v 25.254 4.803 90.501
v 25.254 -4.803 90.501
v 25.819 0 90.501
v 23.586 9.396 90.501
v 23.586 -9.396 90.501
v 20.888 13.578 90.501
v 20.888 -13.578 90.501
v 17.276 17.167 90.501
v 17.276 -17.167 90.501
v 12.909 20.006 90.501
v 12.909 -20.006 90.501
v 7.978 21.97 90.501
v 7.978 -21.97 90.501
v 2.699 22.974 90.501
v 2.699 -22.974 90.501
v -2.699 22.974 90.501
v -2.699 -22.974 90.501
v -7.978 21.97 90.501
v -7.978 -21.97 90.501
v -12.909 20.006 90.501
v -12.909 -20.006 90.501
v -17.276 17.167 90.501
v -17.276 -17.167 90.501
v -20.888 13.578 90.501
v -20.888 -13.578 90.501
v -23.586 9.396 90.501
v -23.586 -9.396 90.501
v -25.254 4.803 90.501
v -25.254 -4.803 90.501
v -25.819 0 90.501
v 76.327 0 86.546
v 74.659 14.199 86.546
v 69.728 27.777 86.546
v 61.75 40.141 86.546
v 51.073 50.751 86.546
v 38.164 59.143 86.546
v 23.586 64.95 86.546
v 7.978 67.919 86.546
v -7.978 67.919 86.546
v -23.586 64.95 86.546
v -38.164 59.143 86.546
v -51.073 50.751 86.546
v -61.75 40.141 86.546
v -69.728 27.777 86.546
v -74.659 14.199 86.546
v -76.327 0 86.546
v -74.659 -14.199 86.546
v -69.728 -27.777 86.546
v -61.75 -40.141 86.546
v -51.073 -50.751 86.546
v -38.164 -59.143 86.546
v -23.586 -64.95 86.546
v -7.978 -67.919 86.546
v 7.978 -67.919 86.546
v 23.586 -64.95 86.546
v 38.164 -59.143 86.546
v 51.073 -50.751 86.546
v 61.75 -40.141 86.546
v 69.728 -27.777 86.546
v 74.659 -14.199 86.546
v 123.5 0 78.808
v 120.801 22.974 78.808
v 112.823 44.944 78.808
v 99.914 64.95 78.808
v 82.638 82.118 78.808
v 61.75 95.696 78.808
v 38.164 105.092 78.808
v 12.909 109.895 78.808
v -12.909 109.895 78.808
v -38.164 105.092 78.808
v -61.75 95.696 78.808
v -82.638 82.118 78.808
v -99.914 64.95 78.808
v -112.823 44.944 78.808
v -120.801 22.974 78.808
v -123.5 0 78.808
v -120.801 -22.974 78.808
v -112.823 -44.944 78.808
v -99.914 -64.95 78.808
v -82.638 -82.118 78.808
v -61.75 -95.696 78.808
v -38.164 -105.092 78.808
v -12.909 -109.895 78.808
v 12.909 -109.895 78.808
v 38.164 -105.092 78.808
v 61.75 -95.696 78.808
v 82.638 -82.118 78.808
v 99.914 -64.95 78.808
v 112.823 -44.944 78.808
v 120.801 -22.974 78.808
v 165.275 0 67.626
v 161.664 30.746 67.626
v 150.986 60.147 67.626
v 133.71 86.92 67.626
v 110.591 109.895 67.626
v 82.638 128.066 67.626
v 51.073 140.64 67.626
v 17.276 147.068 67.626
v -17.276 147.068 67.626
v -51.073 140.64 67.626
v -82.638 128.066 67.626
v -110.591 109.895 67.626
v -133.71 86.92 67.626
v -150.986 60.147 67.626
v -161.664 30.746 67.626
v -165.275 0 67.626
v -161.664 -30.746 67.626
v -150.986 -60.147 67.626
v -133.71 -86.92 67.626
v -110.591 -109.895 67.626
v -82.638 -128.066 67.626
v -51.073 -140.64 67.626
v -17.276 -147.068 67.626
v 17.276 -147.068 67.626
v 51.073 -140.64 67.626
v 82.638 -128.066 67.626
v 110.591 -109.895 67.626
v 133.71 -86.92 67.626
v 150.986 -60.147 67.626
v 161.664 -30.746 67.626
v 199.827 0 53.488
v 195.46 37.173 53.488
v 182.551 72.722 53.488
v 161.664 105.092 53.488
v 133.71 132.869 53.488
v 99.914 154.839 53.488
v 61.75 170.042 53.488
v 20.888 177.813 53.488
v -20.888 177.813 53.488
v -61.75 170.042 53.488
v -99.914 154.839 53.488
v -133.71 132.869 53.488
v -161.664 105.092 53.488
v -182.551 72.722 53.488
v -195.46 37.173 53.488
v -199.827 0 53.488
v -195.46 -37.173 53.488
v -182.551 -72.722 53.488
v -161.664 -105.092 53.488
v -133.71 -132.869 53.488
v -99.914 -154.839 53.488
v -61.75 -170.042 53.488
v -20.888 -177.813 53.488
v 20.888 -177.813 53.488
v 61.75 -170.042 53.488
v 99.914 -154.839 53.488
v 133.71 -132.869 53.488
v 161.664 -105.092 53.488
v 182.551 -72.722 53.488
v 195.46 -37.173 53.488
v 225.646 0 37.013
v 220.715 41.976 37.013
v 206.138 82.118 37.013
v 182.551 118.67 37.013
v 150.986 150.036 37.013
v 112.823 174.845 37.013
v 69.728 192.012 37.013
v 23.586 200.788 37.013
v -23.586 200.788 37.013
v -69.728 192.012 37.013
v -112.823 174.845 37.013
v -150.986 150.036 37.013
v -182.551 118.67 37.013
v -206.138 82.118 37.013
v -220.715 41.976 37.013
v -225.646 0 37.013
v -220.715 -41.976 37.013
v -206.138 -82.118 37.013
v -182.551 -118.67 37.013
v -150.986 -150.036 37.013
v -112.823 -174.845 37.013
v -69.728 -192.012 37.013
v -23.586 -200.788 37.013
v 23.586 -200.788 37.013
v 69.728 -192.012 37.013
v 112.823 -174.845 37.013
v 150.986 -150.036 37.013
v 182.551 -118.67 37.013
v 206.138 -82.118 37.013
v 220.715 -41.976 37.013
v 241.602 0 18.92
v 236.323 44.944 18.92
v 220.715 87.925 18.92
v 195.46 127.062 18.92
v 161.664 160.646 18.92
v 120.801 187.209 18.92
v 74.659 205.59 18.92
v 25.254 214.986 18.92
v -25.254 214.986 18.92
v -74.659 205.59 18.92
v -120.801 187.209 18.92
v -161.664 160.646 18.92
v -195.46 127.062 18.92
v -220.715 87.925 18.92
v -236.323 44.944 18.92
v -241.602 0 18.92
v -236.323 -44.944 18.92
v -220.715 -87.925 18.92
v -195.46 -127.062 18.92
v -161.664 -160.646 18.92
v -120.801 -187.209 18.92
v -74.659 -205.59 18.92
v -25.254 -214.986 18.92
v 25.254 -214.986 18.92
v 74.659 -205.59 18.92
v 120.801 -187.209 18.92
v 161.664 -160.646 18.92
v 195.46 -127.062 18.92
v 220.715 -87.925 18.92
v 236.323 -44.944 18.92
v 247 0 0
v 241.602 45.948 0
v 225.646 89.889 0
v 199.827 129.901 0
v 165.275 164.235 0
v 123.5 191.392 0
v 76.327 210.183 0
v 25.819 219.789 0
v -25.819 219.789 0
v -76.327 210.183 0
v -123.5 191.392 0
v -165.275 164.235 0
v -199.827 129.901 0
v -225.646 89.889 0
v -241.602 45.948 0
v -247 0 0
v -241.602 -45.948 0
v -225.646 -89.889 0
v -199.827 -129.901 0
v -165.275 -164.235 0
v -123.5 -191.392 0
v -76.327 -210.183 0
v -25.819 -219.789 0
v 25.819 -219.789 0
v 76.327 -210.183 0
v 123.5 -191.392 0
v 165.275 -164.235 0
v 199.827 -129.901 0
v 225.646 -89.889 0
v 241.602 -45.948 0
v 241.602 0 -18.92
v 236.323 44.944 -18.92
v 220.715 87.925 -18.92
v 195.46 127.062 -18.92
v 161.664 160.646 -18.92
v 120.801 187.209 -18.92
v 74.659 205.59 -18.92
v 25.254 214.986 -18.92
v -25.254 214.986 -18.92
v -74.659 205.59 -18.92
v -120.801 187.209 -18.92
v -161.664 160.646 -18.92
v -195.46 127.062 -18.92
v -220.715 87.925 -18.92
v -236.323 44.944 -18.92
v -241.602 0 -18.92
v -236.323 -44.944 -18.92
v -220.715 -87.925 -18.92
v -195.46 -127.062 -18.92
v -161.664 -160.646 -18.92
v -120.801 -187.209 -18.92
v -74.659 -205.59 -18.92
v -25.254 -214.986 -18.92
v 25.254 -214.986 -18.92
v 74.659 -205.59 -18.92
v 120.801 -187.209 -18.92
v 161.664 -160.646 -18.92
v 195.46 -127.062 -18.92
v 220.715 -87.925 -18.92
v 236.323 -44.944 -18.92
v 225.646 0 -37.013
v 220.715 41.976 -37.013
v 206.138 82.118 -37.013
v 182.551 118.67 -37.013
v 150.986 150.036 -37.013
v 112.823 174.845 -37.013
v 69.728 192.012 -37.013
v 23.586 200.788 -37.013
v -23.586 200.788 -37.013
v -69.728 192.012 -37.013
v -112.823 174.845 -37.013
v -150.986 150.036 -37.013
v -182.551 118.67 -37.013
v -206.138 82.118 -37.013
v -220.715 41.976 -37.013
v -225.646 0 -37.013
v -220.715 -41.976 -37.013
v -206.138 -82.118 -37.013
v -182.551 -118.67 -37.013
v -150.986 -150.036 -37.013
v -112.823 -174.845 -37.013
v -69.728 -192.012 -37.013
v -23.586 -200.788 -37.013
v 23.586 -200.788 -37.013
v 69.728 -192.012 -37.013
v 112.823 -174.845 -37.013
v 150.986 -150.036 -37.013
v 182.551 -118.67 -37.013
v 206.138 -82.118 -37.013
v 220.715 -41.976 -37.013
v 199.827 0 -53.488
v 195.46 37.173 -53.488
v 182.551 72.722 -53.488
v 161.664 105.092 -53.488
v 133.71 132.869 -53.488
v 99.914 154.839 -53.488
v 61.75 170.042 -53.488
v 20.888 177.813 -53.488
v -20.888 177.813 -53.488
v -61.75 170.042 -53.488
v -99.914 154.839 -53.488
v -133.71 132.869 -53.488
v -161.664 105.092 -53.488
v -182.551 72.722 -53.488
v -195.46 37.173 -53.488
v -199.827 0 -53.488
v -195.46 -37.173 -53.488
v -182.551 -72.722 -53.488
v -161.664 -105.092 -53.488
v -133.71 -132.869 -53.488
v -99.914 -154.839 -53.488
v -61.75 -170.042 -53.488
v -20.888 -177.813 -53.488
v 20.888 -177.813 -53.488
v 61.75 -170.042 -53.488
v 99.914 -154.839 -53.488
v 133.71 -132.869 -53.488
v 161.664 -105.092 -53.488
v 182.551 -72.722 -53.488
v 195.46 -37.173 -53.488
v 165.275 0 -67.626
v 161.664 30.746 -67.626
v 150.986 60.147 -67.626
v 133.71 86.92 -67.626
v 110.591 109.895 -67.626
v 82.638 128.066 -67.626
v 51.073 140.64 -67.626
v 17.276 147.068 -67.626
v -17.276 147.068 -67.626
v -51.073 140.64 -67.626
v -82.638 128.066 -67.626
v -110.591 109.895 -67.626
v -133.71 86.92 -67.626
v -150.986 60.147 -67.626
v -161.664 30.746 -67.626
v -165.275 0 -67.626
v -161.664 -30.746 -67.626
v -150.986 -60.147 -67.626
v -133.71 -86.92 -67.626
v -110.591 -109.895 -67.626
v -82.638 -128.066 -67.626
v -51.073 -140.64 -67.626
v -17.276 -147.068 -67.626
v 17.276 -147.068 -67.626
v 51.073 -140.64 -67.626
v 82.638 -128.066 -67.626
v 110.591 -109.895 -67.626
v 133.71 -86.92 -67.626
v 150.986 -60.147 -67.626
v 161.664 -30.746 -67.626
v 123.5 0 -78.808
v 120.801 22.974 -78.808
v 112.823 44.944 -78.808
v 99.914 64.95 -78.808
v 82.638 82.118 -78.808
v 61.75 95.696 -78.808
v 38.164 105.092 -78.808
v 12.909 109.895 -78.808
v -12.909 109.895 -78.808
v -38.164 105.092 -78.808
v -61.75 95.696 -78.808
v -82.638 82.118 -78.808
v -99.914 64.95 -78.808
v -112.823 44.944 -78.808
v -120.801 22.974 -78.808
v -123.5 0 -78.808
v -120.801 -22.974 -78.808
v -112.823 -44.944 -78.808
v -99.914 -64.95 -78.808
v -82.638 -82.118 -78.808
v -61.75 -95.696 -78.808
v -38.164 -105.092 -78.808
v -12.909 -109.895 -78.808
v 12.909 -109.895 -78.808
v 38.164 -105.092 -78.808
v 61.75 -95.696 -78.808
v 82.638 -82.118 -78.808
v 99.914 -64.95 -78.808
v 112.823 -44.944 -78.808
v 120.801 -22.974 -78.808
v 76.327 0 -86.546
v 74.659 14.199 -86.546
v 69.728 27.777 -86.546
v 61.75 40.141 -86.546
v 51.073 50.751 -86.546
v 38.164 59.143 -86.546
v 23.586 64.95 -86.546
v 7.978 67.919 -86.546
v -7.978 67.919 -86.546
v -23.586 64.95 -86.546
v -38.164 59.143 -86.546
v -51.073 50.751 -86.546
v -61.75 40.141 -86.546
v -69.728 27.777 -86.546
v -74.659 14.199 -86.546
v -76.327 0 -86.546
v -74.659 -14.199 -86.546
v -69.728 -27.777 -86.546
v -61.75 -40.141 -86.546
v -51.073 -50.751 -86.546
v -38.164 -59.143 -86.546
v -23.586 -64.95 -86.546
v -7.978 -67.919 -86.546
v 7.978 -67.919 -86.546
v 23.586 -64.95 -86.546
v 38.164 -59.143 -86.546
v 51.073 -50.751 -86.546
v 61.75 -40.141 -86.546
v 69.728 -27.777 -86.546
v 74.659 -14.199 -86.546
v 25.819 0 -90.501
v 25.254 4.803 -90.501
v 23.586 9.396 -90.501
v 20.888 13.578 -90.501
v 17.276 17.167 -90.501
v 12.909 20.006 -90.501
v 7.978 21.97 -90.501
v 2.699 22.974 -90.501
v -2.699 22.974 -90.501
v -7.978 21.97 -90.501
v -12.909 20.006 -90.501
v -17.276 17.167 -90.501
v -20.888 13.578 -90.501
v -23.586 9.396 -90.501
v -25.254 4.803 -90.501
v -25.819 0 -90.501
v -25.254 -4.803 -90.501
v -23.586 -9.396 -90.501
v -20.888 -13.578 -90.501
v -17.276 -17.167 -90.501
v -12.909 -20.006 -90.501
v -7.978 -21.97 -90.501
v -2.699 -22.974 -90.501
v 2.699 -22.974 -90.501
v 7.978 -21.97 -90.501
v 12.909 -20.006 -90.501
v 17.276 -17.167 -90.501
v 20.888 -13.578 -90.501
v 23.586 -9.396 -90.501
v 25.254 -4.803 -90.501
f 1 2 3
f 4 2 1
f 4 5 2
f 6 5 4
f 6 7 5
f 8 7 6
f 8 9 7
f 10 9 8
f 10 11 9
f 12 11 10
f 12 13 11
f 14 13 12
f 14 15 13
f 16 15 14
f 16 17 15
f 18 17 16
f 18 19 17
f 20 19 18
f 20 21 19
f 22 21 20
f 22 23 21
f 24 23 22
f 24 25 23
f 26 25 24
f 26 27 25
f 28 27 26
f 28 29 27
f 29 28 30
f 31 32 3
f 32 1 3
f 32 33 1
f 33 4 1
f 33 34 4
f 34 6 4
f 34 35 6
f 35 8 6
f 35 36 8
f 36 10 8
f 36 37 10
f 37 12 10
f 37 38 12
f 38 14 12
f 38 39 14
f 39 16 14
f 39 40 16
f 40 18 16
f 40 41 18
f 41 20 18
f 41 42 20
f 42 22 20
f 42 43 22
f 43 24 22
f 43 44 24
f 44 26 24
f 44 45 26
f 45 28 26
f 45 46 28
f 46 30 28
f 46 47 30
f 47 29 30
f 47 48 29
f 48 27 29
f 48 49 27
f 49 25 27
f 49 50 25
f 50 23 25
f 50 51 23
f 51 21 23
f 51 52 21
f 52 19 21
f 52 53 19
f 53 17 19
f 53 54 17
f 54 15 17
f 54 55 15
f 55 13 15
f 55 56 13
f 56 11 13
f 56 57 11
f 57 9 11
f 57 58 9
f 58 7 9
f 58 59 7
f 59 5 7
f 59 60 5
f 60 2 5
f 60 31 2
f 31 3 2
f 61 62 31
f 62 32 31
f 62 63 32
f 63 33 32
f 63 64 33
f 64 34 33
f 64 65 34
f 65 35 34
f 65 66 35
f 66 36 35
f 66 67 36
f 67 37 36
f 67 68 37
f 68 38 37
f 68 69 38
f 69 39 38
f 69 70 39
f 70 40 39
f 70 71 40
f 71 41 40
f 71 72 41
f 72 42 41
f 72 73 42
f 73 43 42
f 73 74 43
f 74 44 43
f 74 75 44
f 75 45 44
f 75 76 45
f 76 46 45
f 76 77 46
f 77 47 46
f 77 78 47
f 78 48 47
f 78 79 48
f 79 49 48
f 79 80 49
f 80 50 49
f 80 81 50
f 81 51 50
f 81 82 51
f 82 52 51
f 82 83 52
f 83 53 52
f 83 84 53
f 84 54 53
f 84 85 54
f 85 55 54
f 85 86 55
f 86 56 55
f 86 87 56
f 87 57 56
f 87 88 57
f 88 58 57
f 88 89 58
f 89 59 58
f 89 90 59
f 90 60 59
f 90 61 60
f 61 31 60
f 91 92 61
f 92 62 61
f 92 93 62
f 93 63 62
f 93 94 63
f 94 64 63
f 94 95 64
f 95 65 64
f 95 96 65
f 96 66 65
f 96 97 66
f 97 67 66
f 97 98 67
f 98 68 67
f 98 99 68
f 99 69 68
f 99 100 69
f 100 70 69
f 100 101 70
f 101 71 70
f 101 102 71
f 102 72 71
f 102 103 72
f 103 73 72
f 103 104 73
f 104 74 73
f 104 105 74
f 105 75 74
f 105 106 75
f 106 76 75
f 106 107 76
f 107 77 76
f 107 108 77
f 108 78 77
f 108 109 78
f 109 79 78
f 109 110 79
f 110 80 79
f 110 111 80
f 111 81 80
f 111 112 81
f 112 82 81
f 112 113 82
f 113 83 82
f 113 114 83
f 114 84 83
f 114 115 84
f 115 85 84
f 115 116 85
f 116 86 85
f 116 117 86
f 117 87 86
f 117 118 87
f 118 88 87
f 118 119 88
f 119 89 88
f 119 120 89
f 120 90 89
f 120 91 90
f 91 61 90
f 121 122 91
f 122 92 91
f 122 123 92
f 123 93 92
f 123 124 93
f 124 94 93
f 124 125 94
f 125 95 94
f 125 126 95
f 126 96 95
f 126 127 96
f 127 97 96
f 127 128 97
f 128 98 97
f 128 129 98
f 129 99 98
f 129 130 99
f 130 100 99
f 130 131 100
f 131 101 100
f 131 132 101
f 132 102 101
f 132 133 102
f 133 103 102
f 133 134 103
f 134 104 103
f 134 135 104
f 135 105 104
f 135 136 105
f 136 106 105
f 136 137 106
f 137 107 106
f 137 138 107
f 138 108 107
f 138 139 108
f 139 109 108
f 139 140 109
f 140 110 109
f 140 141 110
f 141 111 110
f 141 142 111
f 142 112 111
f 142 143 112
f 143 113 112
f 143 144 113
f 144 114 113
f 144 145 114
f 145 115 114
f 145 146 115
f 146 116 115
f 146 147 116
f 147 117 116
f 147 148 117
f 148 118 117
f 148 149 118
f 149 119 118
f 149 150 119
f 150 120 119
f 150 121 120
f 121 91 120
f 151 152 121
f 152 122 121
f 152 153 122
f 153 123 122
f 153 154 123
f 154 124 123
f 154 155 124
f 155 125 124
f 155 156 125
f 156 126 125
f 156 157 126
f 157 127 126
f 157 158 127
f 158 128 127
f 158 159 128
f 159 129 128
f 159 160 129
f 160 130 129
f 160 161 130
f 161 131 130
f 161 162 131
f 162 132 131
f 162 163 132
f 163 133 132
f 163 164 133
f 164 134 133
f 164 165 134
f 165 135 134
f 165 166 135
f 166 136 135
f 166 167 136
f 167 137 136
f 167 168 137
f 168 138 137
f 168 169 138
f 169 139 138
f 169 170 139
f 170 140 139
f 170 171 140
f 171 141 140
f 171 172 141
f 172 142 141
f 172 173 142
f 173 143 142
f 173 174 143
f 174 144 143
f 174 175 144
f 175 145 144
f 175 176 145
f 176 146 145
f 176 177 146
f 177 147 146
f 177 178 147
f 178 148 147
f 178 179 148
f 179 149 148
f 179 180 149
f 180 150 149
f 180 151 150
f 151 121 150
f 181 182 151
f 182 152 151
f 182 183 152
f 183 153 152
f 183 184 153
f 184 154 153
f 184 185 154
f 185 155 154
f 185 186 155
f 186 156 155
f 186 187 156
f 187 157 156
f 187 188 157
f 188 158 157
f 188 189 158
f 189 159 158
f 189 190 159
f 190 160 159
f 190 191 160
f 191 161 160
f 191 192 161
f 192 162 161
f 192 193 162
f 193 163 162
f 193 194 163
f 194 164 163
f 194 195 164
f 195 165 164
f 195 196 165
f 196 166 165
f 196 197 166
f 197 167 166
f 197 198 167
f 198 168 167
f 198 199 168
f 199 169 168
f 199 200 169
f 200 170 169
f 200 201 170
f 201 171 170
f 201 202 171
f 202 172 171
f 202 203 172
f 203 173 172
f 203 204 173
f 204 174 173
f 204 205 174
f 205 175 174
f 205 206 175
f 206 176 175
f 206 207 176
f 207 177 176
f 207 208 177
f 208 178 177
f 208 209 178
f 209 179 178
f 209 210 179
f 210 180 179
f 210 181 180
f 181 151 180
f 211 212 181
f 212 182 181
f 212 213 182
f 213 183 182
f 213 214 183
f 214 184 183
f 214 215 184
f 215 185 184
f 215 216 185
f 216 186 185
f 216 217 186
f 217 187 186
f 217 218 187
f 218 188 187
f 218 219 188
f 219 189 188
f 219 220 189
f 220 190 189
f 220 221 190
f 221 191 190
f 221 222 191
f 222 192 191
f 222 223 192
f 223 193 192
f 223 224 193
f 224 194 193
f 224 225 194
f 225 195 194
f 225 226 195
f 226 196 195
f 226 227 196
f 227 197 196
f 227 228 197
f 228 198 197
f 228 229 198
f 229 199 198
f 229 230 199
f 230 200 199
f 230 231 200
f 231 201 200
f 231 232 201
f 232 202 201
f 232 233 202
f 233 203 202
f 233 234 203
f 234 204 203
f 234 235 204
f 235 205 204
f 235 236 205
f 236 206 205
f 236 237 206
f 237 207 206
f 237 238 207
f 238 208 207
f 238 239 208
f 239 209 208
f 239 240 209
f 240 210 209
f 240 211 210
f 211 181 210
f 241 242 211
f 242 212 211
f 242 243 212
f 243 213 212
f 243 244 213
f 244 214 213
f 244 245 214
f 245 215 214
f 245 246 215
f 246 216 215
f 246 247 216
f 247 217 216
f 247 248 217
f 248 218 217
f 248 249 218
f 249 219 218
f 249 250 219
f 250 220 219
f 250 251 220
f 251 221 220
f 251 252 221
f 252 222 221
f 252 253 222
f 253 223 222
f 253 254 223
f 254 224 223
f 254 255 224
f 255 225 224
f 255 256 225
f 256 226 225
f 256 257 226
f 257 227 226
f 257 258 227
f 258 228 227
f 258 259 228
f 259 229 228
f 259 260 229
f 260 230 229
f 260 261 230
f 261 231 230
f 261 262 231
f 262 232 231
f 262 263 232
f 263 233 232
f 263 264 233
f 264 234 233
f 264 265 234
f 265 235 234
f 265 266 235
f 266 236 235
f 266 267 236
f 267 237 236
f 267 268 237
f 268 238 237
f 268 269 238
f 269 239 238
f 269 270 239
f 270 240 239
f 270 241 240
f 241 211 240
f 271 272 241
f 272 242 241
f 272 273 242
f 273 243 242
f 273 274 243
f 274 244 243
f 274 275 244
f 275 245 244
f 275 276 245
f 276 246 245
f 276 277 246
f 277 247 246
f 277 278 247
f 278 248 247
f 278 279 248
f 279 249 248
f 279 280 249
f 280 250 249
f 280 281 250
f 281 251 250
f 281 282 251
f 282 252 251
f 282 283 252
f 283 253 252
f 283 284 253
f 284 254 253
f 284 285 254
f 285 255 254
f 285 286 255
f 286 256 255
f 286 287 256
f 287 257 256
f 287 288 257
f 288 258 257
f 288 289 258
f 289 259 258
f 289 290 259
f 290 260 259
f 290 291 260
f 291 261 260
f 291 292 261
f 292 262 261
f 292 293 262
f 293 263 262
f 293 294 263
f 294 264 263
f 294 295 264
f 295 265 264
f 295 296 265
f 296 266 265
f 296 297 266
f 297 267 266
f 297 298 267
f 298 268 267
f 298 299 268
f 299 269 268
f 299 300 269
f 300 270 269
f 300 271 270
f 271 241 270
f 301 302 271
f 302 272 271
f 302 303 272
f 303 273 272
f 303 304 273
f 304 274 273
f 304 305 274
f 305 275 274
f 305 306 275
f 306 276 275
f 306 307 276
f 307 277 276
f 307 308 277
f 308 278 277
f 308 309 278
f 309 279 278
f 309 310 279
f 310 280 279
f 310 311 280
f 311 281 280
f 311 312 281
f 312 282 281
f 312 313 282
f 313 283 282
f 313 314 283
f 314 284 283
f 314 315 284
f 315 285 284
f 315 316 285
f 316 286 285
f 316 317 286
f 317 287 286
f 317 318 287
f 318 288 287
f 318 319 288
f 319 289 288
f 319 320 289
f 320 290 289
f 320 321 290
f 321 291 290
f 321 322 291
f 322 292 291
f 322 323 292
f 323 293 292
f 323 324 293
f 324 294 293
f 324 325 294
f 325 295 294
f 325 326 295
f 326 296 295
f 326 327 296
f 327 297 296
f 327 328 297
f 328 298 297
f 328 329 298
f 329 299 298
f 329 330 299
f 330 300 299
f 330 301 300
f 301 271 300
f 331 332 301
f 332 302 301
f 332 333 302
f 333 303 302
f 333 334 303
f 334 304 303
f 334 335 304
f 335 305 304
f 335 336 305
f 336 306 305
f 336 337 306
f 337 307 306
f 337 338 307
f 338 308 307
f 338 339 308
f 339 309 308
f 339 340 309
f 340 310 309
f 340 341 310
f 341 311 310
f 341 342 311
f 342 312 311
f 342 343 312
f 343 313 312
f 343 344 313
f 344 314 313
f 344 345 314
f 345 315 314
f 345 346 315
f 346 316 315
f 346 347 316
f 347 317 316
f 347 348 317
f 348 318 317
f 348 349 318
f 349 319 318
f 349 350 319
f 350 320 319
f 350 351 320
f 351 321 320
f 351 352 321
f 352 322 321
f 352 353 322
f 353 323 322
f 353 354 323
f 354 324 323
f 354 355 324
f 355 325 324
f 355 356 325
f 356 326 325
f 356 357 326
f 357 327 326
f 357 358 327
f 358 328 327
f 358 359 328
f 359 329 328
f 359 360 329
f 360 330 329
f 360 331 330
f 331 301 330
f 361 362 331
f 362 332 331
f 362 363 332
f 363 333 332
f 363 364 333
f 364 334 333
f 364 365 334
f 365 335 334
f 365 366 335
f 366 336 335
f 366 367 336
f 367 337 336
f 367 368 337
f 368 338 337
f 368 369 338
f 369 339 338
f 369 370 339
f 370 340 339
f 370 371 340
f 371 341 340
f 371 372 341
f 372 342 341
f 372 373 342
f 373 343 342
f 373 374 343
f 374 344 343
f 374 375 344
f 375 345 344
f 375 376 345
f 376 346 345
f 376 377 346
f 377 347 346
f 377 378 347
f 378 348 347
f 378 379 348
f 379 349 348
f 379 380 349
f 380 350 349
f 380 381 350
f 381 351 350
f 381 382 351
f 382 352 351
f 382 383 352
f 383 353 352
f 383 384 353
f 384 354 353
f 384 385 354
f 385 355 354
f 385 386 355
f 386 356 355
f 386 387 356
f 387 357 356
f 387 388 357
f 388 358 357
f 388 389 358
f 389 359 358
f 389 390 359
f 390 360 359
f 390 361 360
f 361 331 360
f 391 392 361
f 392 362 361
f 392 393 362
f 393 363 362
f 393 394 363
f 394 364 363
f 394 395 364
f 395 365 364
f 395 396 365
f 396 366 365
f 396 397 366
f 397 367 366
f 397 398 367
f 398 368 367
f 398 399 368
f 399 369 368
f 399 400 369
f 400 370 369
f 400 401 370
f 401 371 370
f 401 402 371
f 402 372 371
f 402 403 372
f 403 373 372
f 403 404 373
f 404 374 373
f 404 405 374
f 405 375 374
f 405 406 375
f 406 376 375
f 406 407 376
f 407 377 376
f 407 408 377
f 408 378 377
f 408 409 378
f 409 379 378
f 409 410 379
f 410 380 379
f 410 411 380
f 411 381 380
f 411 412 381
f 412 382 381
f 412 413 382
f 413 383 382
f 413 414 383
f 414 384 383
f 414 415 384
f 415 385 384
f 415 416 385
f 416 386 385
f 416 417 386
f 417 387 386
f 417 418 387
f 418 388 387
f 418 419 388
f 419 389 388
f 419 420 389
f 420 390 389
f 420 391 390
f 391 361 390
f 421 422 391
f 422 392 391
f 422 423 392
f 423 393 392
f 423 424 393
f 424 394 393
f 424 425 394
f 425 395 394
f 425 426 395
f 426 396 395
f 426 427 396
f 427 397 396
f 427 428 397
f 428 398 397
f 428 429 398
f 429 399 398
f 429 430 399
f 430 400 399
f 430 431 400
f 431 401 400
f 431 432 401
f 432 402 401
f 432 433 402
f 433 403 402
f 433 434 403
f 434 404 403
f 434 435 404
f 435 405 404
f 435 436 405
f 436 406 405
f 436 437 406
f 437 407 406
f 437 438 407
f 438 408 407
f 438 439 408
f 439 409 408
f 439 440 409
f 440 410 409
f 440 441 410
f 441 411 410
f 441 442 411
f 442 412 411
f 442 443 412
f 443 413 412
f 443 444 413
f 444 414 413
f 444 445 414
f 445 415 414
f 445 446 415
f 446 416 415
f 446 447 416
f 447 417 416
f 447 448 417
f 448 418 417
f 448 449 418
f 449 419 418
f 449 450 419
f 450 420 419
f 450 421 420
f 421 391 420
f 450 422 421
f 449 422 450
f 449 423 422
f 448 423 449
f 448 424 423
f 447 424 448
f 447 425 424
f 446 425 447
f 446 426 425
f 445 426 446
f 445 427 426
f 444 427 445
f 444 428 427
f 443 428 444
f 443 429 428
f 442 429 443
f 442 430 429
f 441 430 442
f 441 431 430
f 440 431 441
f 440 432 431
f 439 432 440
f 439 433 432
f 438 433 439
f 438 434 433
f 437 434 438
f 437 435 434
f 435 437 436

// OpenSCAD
// Generated by SolidPython 1.0.1 on 2020-07-29 00:46:54


scale(v = [19, 17, 7]) {
	sphere(r = 13);
}
/***********************************************
*********      SolidPython code:      **********
************************************************
 
# import packages: SolidPython
from solid import *
from solid.utils import *
from itertools import chain, combinations, permutations


class Resize:

    def __init__(self, scad_file):
        self.scad_file = scad_file
        #self.scad_file = import_scad(scad_file)
        # cone/cylinder param:
        self.r1 = 0
        self.r2 = 0
        self.h = 0
        # rectangular prism param:
        self.w = 0
        self.l = 0
        # ellipse param:
        self.r = 0

    # import OpenScad code (file name corresponds to shape)


    # classify shape + parameters
    def assign(self, param1, param2, param3):
        if self.scad_file == 'cone.scad':
            self.r1 = param1
            self.r2 = param2
            self.h = param3
        elif self.scad_file == 'cylinder.scad':
            self.r1 = param1
            self.r2 = param2
            self.h = param3
        elif self.scad_file == 'rectangularPrism.scad':
            self.h = param1
            self.l = param2
            self.w = param3
        else:
            self.r = param1
            self.h = param2

    # resize parameters
    def iterate(self):
        x = range(3, 20, 2)
        i = 1
        if self.scad_file == 'cone.scad':
            tempList = list(permutations(x, 2))
            for temp in tempList:
                param1 = temp[0]
                param2 = temp[1]
                filepath = 'produced_scad_files/' + 'cone' + str(param1) + '_' + str(param2) + '_' + '.scad'
                scad_render_to_file(cylinder(h=param1, r1=param2, r2=0), filepath)

        elif self.scad_file == 'cylinder.scad':
            tempList = list(permutations(x, 3))
            for temp in tempList:
                param1 = temp[0]
                param2 = temp[1]
                filepath = 'produced_scad_files/' + 'cylinder' + str(param1) + '_' + str(param2) + '_' + '.scad'
                scad_render_to_file(cylinder(h=param1, r1=param2, r2=param2), filepath)

        elif self.scad_file == 'rectangularPrism.scad':
            tempList = list(permutations(x, 3))
            for temp in tempList:
                param1 = temp[0]
                param2 = temp[1]
                param3 = temp[2]
                filepath = 'produced_scad_files/' + 'rectangularPrism' + str(param1) + '_' + str(param2) + '_' + str(
                    param3) + '.scad'
                scad_render_to_file(cube(size=(param1, param2, param3)), filepath)

        elif self.scad_file == 'ellipse.scad':
            tempList = list(permutations(x, 4))
            for temp in tempList:
                param1 = temp[0]
                param2 = temp[1]
                param3 = temp[2]
                param4 = temp[3]
                filepath = 'produced_scad_files/' + 'ellipse' + str(param1) + '_' + str(param2) + '_' + str(param3) + '_' + str(param4) + '.scad'
                scad_render_to_file(scale([param1, param2, param3])(sphere(r=param4)), filepath)

    def render_to_scadfile(self):
        scad_render_to_file(scad, 'example.scad') 
 
************************************************/
